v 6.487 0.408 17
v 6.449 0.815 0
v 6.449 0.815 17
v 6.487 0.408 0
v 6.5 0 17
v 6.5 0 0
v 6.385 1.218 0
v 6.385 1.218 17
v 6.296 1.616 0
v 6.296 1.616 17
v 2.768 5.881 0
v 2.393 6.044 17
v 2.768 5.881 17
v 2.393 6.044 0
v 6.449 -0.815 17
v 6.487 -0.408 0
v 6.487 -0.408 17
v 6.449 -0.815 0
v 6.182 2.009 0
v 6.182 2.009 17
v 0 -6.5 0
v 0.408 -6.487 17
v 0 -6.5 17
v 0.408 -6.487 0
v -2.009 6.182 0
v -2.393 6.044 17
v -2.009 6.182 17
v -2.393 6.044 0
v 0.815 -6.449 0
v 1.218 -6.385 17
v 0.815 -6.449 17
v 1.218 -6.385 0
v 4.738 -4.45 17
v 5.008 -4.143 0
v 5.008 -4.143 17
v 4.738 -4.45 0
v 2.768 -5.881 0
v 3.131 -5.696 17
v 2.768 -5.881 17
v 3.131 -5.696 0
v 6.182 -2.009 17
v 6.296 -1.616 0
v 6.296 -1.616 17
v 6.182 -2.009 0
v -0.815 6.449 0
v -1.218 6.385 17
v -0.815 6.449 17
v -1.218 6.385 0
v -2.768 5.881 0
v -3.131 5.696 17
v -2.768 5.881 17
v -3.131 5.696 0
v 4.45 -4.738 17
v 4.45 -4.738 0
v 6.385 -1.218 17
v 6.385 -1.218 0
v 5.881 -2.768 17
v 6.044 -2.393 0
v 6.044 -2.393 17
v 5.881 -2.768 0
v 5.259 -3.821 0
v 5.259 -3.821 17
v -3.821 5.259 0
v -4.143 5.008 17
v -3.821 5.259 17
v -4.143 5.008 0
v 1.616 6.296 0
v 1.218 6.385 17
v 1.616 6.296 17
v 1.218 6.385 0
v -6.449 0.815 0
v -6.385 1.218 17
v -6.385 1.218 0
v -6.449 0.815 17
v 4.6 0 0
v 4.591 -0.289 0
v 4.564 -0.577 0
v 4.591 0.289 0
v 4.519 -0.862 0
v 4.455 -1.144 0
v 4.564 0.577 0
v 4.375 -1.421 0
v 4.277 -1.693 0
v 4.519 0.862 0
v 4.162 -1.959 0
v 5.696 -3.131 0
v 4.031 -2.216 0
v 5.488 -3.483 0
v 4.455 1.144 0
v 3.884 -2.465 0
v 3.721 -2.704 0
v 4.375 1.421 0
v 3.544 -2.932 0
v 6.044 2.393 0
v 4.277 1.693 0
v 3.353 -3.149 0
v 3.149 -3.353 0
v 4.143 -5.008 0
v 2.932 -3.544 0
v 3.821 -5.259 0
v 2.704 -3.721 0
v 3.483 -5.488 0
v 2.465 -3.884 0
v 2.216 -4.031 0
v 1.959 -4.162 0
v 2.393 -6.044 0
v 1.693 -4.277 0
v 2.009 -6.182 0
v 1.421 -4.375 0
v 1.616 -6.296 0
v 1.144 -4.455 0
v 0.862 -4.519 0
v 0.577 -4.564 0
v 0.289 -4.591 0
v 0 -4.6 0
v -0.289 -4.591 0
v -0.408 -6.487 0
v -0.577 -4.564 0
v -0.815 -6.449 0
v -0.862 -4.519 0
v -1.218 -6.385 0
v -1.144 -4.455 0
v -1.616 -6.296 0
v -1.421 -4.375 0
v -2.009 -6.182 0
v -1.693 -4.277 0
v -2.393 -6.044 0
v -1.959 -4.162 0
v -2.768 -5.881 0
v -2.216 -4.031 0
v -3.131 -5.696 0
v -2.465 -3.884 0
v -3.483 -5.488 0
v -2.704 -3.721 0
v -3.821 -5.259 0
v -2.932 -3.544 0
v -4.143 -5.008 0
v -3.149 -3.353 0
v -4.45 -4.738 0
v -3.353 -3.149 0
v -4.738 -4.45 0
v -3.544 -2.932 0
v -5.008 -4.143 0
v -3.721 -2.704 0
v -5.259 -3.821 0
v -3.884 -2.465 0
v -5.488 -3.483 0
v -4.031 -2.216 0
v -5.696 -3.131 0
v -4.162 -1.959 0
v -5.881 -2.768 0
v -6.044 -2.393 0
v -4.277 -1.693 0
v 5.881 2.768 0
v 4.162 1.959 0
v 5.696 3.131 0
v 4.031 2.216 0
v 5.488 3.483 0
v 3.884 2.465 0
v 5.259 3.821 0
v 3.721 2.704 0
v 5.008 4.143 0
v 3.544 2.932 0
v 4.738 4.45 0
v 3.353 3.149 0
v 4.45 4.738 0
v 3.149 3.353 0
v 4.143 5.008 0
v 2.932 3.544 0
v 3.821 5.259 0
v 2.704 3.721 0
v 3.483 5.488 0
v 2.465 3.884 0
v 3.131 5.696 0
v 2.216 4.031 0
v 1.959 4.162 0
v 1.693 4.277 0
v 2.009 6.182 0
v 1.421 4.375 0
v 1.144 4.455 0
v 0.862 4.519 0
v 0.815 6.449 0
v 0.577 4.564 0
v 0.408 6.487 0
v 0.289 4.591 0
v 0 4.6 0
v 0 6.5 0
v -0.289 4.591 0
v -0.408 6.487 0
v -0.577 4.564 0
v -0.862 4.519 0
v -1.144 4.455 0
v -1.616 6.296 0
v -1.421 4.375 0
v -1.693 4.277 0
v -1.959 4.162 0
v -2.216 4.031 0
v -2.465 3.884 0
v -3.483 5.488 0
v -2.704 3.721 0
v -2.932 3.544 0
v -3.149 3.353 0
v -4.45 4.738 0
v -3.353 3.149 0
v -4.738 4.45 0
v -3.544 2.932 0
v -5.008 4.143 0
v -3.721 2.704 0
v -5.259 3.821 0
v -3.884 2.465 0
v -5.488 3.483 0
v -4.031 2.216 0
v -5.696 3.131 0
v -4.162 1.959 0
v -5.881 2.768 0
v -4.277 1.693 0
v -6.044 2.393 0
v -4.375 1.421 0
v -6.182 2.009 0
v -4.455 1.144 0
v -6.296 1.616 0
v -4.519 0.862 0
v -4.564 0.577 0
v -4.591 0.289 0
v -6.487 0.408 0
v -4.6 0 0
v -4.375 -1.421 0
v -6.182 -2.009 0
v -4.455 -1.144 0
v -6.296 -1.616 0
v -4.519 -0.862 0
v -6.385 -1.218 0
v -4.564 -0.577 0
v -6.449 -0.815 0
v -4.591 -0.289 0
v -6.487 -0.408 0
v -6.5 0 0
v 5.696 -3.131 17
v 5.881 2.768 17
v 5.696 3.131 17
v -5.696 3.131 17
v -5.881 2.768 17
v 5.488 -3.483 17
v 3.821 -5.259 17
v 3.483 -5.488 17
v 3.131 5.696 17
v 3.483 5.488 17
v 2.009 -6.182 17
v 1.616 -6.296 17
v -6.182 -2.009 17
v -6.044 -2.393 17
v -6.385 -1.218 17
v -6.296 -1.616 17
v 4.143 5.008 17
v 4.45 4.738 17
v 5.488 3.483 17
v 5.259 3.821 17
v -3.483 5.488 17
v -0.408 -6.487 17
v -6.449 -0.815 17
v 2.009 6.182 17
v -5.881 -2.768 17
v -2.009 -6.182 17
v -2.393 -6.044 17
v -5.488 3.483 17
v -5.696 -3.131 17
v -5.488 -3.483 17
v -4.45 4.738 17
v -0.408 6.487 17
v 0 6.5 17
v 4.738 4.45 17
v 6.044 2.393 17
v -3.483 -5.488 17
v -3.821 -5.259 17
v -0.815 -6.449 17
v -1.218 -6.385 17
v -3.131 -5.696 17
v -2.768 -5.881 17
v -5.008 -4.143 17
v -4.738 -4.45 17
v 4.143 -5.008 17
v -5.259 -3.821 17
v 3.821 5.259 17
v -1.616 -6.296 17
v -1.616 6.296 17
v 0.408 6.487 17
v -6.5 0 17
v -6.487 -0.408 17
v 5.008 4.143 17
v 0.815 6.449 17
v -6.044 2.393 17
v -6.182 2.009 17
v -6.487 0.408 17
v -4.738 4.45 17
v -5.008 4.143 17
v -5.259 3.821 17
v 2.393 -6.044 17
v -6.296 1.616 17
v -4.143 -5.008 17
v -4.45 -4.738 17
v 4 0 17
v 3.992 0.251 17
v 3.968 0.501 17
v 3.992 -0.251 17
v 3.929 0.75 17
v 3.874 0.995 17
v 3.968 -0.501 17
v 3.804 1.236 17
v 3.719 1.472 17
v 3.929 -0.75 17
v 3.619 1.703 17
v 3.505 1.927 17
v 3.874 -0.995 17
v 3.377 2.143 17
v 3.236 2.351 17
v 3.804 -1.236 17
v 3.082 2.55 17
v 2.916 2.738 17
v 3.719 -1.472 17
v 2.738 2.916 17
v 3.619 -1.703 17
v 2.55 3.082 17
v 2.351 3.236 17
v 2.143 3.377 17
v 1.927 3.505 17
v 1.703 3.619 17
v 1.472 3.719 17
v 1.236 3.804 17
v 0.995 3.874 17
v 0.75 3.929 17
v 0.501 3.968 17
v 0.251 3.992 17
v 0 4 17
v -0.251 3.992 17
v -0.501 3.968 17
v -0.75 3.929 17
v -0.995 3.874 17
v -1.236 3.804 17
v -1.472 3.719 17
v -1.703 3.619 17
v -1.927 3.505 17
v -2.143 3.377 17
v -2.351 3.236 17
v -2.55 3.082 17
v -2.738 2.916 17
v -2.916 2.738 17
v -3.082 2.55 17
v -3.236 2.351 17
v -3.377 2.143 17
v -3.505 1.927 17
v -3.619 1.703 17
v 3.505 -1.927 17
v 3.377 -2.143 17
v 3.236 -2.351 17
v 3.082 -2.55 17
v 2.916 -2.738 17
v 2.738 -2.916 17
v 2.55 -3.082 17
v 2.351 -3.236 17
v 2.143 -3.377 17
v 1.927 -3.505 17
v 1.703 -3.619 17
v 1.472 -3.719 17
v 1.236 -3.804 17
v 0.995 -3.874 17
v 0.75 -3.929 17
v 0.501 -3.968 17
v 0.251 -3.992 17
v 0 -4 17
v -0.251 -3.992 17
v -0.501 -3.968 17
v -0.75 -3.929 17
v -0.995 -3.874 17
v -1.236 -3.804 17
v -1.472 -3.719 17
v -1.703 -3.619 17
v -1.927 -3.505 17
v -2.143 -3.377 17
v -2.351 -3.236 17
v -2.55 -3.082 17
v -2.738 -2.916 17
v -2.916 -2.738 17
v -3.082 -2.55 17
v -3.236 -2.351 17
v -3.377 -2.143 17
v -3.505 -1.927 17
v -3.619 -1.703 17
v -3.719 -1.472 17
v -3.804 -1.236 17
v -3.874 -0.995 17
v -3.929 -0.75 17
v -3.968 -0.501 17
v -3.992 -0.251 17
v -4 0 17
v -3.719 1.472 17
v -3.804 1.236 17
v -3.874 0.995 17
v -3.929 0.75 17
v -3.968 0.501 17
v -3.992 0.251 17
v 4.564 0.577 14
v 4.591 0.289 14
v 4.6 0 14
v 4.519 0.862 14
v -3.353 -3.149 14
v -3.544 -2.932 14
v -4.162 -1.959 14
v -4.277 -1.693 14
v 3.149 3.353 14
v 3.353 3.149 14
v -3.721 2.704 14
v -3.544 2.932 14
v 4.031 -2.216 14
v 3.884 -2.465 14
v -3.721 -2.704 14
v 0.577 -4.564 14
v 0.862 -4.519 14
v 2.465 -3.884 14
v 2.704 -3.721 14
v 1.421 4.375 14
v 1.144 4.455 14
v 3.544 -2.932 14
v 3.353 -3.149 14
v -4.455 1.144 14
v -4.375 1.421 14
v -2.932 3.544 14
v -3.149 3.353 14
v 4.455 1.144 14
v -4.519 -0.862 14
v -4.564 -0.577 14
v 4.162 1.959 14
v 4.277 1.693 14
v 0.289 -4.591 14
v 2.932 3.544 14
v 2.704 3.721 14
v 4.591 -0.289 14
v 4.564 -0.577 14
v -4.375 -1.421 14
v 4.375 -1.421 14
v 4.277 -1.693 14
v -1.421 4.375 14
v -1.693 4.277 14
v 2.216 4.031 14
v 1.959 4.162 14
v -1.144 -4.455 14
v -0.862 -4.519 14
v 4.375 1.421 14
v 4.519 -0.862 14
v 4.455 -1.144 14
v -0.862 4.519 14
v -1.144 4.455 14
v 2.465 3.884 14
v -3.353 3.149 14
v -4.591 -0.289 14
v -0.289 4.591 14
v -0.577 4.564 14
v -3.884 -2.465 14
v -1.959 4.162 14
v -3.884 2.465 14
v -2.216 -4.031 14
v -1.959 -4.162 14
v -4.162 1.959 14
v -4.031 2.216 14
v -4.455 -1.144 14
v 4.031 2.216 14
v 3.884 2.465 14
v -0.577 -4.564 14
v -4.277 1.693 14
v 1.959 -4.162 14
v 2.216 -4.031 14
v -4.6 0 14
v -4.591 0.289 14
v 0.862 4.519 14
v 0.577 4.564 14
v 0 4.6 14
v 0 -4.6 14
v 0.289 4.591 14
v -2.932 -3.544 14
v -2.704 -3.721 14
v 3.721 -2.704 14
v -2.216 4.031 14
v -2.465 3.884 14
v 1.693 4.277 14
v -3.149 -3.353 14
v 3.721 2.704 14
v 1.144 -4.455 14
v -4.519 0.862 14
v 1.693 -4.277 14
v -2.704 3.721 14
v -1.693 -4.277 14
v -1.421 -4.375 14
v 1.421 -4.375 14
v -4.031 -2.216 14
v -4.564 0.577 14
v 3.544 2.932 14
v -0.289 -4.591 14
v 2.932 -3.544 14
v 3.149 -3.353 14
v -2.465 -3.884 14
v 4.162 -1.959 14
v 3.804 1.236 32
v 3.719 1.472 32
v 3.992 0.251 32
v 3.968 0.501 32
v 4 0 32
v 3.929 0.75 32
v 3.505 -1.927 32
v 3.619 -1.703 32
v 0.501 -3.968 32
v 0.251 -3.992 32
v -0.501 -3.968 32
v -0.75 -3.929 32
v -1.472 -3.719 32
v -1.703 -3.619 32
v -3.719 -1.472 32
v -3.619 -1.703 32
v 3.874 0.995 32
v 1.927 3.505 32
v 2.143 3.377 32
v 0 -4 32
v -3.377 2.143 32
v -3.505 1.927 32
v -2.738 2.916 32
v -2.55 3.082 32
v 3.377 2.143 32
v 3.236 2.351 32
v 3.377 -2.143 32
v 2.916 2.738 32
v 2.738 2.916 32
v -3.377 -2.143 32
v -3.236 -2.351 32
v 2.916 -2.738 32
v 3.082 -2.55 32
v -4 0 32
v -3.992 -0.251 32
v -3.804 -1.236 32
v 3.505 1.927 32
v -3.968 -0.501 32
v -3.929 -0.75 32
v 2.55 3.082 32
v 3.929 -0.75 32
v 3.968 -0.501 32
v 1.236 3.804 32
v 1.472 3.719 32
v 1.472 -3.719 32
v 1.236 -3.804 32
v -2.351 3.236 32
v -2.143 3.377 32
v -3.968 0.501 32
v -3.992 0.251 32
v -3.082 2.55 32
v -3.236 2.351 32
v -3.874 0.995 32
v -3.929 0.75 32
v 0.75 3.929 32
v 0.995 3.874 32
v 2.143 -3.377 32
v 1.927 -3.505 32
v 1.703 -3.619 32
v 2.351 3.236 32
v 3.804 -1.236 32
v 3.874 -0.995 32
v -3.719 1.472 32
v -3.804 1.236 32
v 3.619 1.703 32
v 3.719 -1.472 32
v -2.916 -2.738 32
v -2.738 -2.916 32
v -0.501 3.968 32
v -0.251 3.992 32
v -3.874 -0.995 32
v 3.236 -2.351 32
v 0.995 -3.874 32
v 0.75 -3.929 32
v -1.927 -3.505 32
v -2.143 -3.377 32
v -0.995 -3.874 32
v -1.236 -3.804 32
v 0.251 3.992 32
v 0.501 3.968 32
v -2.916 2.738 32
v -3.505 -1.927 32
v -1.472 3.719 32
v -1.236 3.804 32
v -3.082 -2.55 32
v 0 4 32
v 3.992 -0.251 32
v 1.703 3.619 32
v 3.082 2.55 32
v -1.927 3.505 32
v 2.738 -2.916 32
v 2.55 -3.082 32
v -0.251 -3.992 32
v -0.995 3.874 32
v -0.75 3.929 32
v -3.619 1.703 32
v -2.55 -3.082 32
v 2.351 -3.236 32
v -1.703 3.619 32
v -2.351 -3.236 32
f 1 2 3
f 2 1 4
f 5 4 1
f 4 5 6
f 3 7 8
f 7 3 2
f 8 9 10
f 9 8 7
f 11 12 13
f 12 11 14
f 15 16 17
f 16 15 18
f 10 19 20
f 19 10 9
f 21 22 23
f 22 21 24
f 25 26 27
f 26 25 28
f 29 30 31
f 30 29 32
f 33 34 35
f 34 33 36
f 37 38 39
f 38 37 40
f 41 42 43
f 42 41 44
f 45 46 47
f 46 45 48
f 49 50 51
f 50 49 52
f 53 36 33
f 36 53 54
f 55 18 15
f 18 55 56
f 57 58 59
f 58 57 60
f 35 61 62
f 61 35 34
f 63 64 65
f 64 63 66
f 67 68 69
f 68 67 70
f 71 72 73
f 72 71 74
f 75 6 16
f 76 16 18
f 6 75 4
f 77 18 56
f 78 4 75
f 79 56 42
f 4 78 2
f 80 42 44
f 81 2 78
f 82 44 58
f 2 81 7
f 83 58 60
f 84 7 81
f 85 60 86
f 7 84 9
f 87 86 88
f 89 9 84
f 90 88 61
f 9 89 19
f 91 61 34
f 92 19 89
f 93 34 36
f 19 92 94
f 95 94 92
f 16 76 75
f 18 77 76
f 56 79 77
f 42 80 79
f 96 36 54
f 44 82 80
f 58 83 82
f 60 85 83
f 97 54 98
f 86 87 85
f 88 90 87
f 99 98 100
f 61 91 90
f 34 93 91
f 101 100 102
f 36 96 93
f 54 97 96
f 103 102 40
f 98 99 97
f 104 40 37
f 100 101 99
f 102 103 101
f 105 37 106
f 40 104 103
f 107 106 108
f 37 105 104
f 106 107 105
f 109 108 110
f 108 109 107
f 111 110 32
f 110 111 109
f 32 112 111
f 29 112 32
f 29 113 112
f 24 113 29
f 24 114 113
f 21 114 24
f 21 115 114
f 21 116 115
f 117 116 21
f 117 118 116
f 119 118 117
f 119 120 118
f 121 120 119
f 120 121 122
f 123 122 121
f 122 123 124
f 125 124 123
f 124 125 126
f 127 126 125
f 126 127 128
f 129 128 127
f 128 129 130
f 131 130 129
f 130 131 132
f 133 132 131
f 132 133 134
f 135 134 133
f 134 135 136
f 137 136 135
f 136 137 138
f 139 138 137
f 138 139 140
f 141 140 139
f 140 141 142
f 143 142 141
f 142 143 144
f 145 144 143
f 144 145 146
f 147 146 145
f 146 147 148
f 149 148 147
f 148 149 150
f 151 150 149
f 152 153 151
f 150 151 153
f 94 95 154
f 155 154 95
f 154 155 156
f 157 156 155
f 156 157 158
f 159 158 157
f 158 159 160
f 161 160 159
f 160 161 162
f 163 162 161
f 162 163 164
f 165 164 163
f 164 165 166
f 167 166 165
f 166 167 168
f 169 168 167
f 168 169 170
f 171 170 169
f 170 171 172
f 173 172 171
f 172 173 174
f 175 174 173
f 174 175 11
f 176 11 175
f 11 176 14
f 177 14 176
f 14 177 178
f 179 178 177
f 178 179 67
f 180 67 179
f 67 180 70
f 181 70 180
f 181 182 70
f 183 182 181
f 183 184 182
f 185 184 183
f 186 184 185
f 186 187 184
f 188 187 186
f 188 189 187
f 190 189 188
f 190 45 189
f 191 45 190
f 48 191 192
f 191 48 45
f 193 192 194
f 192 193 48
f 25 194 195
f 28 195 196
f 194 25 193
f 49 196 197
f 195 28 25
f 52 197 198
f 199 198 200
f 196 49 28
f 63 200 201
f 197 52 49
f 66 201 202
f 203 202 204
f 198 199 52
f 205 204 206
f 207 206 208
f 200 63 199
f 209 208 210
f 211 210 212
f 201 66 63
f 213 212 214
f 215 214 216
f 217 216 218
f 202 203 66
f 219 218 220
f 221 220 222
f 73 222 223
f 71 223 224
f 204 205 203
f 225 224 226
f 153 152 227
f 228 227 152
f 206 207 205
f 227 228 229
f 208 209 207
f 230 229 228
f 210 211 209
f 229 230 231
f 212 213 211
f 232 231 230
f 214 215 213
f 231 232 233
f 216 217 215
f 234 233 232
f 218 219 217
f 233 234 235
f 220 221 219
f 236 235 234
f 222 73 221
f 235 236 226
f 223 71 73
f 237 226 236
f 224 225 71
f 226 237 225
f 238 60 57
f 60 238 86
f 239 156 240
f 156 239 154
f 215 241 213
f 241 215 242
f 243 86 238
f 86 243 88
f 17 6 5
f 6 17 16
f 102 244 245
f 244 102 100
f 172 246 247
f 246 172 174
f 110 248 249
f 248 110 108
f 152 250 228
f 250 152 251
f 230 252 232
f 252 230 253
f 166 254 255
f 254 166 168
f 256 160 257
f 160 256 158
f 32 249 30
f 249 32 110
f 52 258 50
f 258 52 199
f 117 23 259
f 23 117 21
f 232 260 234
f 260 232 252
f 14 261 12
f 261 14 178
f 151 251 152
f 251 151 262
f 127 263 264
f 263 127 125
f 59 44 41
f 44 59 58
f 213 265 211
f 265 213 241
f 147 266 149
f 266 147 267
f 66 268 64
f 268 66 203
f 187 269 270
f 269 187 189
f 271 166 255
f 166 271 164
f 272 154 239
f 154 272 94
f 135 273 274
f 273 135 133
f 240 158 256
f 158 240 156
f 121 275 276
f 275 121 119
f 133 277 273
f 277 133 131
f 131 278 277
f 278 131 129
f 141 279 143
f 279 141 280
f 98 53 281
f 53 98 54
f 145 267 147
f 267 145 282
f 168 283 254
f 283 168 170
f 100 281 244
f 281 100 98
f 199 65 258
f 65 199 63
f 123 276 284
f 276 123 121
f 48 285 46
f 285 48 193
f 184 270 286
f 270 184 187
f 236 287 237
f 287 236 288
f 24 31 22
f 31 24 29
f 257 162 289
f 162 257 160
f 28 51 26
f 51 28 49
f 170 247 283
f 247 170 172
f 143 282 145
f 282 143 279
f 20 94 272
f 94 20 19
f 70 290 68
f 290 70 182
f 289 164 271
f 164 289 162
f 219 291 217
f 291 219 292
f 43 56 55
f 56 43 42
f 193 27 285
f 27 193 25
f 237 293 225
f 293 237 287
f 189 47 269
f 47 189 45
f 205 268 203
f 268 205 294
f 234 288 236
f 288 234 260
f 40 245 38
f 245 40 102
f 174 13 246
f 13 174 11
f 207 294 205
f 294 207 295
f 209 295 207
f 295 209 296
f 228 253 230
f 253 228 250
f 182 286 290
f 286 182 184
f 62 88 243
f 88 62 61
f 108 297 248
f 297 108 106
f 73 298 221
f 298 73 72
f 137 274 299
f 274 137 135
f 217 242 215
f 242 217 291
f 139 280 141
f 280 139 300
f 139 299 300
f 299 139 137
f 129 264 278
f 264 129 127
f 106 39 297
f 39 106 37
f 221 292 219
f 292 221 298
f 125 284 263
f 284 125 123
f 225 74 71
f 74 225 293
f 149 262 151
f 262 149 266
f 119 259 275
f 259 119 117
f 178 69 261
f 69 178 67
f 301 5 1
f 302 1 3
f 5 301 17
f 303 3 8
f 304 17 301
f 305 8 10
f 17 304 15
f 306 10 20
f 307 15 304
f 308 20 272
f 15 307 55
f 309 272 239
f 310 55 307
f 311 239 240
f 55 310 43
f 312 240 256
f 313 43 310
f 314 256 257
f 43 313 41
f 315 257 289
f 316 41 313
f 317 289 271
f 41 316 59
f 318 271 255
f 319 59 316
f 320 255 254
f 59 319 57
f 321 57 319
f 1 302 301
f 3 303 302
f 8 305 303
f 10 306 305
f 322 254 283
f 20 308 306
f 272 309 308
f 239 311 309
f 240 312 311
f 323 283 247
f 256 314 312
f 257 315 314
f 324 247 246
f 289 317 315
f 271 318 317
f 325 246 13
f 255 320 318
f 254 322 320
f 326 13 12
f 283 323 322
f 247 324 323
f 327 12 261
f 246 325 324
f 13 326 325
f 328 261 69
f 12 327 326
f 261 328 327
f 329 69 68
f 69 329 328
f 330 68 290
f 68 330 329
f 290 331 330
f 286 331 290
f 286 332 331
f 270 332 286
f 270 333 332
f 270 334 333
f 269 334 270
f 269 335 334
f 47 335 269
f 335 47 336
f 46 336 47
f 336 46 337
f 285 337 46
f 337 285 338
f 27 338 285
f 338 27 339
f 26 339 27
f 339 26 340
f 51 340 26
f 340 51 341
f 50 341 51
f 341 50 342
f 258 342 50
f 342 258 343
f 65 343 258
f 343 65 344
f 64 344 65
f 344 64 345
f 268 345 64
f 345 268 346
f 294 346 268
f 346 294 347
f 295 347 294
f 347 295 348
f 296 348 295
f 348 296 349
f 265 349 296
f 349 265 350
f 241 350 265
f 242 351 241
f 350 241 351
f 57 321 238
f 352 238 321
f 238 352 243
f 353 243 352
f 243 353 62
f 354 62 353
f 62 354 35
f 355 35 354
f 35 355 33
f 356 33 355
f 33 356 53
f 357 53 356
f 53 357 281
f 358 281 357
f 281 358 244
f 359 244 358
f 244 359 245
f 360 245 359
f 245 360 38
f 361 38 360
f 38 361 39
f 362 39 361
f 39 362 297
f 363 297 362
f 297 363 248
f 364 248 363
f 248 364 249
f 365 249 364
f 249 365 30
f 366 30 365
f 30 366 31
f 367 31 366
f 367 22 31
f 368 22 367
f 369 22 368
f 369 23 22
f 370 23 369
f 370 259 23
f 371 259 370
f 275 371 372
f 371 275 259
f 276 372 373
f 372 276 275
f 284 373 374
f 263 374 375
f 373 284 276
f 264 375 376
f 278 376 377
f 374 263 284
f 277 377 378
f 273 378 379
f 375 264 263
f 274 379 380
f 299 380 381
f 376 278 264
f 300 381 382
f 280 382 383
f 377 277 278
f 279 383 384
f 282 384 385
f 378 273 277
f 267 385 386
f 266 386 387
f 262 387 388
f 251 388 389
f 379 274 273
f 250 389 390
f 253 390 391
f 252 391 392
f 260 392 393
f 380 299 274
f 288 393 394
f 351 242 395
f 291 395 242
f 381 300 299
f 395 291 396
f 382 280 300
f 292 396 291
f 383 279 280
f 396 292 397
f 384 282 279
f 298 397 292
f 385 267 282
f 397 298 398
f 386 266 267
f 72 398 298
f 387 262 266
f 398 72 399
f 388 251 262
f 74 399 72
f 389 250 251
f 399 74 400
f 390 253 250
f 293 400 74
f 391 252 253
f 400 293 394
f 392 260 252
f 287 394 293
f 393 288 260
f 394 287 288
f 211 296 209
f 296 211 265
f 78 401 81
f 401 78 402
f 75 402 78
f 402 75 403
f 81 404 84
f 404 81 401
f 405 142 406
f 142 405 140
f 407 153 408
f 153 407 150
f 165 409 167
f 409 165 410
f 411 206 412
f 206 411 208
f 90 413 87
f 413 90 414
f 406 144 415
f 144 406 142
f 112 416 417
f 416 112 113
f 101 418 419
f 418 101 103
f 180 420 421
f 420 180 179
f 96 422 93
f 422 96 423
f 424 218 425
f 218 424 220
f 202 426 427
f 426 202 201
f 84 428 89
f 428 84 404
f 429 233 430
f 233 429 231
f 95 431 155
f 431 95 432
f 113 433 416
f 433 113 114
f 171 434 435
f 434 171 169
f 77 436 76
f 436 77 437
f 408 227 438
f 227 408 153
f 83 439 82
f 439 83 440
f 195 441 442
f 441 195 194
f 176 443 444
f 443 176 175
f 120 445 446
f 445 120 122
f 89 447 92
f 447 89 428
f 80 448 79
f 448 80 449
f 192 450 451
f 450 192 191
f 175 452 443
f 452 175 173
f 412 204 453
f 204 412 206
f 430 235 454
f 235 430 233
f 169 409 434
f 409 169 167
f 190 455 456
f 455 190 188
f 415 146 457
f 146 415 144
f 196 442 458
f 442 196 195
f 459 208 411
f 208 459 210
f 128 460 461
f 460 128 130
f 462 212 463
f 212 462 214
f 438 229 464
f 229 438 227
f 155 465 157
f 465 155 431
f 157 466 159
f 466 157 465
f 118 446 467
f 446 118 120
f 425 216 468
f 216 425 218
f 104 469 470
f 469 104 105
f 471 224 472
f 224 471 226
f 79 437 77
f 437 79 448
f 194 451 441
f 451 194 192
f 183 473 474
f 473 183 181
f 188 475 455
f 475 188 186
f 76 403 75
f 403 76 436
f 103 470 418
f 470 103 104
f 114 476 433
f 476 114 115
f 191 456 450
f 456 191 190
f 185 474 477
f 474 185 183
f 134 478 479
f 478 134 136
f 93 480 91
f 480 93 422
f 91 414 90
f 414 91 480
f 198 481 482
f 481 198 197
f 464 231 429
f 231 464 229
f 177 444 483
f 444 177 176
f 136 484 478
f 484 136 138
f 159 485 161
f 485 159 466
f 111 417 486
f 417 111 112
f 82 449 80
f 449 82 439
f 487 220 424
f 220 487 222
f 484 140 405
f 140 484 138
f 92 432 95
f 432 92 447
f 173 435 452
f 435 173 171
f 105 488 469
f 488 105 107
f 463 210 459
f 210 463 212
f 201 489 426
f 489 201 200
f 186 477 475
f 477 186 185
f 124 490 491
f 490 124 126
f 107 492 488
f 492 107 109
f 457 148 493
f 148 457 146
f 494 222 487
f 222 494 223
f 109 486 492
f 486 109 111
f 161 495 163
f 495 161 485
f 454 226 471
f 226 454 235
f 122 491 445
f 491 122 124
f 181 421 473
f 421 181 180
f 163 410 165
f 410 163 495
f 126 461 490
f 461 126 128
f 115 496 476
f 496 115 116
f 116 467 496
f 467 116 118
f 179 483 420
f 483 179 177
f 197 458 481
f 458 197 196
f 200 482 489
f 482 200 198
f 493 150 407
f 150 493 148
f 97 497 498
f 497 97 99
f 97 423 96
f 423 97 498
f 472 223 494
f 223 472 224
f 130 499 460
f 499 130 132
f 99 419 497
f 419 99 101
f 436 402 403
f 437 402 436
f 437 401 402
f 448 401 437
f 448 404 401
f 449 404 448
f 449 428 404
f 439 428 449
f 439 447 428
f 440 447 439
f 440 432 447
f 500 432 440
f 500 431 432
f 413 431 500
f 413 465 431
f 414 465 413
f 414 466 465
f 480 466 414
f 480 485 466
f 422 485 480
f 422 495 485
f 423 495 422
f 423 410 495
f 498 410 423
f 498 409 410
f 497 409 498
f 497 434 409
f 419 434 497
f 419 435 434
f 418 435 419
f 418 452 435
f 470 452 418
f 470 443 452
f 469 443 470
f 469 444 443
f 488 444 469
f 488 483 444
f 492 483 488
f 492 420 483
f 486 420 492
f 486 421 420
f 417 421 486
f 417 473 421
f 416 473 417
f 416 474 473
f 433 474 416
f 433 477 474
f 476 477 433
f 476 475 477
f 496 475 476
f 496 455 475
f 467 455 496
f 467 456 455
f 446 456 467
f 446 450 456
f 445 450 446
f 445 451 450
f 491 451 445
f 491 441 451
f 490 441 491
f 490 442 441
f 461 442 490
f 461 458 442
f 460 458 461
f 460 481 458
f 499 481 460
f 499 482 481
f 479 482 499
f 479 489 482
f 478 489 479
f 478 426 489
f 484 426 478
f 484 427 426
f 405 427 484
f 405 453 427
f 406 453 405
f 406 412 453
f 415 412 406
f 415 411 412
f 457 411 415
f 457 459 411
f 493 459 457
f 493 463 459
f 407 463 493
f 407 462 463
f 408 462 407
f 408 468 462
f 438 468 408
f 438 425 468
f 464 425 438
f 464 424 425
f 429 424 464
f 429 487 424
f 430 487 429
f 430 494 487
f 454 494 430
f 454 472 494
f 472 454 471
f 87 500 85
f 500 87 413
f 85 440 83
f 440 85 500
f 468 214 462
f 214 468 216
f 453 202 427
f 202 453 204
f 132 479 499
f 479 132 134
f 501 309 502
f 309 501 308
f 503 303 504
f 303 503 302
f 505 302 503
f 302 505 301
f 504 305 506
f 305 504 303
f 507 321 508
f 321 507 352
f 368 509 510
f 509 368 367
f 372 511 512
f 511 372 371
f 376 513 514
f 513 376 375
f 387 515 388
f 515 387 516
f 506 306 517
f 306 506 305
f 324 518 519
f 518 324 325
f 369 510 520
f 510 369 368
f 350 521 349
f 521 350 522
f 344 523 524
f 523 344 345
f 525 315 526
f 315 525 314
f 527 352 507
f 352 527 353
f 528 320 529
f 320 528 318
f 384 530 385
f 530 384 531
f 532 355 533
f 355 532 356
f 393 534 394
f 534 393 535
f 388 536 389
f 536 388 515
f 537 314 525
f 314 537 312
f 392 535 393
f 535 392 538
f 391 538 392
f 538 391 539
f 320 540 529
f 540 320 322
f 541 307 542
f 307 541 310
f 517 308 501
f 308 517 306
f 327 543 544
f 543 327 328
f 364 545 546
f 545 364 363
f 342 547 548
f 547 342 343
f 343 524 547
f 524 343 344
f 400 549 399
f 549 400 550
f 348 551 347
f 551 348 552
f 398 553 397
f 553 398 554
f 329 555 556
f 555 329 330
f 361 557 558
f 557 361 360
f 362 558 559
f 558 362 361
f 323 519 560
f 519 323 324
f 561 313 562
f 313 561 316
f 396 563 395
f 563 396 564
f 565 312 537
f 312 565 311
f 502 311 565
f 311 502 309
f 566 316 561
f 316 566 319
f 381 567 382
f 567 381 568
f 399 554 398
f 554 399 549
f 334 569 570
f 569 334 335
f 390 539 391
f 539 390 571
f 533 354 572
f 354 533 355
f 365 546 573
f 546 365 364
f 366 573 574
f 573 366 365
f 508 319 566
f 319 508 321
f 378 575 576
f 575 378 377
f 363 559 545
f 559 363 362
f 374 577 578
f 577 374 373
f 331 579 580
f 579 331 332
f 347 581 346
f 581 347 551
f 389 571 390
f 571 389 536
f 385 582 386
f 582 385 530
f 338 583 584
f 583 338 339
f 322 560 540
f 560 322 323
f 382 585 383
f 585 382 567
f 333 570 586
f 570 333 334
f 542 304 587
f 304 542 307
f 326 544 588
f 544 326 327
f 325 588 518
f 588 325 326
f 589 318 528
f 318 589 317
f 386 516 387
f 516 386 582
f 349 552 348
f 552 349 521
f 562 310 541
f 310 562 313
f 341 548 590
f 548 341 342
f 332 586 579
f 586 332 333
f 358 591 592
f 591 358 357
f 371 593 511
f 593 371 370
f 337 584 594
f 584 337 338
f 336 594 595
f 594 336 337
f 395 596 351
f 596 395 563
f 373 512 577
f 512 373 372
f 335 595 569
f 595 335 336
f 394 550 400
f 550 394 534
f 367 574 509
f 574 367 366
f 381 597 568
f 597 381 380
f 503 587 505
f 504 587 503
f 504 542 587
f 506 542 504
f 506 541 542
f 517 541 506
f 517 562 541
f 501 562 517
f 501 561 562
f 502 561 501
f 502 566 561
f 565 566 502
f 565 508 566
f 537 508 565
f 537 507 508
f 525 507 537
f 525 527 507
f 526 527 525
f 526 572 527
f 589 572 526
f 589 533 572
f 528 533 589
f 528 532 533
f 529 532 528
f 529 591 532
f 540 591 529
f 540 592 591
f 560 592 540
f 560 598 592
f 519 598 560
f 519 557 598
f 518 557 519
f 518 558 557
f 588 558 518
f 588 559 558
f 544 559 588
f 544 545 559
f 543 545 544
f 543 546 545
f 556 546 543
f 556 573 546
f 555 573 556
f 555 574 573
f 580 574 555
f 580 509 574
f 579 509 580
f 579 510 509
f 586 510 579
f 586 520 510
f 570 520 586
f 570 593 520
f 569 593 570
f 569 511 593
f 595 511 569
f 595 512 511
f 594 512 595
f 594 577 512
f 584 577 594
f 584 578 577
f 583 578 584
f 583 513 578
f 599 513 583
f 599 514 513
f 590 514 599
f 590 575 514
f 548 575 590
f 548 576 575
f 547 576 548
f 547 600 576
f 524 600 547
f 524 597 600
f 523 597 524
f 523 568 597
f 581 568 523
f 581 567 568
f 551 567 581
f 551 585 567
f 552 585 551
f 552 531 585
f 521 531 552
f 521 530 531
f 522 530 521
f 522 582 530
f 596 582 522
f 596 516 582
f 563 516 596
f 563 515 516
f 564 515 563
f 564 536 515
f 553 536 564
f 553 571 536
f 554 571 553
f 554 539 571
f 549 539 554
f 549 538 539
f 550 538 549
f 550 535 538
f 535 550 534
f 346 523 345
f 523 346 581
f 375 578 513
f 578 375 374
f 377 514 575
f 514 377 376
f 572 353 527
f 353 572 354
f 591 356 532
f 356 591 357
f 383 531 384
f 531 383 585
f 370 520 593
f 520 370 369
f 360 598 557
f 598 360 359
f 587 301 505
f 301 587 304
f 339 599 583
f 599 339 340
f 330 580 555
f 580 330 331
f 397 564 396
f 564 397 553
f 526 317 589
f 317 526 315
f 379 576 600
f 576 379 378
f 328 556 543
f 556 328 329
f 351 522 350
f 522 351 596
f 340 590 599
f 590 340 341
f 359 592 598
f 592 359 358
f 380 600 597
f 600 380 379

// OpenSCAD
//// Redukce ke spojce
$fn=100;

/// Parametry

//V mikroskopu
dv = 13; // Vnější průměr trubky
dd = 9.2; // Vnitrřní průměr trubky (průměr díry)
hm = 30 - 13; //Výška válce do mikroskopu


// Do spojky
ds = 8; // Průměr konce ve spojce
hs = 15; // Délka osy do spojky


difference() {
cylinder(hm, dv/2, dv/2);

translate([0,0,-3])
cylinder(hm, dd/2, dd/2);


}

translate([0,0,hm-1])
cylinder(hs+1, ds/2, ds/2);
